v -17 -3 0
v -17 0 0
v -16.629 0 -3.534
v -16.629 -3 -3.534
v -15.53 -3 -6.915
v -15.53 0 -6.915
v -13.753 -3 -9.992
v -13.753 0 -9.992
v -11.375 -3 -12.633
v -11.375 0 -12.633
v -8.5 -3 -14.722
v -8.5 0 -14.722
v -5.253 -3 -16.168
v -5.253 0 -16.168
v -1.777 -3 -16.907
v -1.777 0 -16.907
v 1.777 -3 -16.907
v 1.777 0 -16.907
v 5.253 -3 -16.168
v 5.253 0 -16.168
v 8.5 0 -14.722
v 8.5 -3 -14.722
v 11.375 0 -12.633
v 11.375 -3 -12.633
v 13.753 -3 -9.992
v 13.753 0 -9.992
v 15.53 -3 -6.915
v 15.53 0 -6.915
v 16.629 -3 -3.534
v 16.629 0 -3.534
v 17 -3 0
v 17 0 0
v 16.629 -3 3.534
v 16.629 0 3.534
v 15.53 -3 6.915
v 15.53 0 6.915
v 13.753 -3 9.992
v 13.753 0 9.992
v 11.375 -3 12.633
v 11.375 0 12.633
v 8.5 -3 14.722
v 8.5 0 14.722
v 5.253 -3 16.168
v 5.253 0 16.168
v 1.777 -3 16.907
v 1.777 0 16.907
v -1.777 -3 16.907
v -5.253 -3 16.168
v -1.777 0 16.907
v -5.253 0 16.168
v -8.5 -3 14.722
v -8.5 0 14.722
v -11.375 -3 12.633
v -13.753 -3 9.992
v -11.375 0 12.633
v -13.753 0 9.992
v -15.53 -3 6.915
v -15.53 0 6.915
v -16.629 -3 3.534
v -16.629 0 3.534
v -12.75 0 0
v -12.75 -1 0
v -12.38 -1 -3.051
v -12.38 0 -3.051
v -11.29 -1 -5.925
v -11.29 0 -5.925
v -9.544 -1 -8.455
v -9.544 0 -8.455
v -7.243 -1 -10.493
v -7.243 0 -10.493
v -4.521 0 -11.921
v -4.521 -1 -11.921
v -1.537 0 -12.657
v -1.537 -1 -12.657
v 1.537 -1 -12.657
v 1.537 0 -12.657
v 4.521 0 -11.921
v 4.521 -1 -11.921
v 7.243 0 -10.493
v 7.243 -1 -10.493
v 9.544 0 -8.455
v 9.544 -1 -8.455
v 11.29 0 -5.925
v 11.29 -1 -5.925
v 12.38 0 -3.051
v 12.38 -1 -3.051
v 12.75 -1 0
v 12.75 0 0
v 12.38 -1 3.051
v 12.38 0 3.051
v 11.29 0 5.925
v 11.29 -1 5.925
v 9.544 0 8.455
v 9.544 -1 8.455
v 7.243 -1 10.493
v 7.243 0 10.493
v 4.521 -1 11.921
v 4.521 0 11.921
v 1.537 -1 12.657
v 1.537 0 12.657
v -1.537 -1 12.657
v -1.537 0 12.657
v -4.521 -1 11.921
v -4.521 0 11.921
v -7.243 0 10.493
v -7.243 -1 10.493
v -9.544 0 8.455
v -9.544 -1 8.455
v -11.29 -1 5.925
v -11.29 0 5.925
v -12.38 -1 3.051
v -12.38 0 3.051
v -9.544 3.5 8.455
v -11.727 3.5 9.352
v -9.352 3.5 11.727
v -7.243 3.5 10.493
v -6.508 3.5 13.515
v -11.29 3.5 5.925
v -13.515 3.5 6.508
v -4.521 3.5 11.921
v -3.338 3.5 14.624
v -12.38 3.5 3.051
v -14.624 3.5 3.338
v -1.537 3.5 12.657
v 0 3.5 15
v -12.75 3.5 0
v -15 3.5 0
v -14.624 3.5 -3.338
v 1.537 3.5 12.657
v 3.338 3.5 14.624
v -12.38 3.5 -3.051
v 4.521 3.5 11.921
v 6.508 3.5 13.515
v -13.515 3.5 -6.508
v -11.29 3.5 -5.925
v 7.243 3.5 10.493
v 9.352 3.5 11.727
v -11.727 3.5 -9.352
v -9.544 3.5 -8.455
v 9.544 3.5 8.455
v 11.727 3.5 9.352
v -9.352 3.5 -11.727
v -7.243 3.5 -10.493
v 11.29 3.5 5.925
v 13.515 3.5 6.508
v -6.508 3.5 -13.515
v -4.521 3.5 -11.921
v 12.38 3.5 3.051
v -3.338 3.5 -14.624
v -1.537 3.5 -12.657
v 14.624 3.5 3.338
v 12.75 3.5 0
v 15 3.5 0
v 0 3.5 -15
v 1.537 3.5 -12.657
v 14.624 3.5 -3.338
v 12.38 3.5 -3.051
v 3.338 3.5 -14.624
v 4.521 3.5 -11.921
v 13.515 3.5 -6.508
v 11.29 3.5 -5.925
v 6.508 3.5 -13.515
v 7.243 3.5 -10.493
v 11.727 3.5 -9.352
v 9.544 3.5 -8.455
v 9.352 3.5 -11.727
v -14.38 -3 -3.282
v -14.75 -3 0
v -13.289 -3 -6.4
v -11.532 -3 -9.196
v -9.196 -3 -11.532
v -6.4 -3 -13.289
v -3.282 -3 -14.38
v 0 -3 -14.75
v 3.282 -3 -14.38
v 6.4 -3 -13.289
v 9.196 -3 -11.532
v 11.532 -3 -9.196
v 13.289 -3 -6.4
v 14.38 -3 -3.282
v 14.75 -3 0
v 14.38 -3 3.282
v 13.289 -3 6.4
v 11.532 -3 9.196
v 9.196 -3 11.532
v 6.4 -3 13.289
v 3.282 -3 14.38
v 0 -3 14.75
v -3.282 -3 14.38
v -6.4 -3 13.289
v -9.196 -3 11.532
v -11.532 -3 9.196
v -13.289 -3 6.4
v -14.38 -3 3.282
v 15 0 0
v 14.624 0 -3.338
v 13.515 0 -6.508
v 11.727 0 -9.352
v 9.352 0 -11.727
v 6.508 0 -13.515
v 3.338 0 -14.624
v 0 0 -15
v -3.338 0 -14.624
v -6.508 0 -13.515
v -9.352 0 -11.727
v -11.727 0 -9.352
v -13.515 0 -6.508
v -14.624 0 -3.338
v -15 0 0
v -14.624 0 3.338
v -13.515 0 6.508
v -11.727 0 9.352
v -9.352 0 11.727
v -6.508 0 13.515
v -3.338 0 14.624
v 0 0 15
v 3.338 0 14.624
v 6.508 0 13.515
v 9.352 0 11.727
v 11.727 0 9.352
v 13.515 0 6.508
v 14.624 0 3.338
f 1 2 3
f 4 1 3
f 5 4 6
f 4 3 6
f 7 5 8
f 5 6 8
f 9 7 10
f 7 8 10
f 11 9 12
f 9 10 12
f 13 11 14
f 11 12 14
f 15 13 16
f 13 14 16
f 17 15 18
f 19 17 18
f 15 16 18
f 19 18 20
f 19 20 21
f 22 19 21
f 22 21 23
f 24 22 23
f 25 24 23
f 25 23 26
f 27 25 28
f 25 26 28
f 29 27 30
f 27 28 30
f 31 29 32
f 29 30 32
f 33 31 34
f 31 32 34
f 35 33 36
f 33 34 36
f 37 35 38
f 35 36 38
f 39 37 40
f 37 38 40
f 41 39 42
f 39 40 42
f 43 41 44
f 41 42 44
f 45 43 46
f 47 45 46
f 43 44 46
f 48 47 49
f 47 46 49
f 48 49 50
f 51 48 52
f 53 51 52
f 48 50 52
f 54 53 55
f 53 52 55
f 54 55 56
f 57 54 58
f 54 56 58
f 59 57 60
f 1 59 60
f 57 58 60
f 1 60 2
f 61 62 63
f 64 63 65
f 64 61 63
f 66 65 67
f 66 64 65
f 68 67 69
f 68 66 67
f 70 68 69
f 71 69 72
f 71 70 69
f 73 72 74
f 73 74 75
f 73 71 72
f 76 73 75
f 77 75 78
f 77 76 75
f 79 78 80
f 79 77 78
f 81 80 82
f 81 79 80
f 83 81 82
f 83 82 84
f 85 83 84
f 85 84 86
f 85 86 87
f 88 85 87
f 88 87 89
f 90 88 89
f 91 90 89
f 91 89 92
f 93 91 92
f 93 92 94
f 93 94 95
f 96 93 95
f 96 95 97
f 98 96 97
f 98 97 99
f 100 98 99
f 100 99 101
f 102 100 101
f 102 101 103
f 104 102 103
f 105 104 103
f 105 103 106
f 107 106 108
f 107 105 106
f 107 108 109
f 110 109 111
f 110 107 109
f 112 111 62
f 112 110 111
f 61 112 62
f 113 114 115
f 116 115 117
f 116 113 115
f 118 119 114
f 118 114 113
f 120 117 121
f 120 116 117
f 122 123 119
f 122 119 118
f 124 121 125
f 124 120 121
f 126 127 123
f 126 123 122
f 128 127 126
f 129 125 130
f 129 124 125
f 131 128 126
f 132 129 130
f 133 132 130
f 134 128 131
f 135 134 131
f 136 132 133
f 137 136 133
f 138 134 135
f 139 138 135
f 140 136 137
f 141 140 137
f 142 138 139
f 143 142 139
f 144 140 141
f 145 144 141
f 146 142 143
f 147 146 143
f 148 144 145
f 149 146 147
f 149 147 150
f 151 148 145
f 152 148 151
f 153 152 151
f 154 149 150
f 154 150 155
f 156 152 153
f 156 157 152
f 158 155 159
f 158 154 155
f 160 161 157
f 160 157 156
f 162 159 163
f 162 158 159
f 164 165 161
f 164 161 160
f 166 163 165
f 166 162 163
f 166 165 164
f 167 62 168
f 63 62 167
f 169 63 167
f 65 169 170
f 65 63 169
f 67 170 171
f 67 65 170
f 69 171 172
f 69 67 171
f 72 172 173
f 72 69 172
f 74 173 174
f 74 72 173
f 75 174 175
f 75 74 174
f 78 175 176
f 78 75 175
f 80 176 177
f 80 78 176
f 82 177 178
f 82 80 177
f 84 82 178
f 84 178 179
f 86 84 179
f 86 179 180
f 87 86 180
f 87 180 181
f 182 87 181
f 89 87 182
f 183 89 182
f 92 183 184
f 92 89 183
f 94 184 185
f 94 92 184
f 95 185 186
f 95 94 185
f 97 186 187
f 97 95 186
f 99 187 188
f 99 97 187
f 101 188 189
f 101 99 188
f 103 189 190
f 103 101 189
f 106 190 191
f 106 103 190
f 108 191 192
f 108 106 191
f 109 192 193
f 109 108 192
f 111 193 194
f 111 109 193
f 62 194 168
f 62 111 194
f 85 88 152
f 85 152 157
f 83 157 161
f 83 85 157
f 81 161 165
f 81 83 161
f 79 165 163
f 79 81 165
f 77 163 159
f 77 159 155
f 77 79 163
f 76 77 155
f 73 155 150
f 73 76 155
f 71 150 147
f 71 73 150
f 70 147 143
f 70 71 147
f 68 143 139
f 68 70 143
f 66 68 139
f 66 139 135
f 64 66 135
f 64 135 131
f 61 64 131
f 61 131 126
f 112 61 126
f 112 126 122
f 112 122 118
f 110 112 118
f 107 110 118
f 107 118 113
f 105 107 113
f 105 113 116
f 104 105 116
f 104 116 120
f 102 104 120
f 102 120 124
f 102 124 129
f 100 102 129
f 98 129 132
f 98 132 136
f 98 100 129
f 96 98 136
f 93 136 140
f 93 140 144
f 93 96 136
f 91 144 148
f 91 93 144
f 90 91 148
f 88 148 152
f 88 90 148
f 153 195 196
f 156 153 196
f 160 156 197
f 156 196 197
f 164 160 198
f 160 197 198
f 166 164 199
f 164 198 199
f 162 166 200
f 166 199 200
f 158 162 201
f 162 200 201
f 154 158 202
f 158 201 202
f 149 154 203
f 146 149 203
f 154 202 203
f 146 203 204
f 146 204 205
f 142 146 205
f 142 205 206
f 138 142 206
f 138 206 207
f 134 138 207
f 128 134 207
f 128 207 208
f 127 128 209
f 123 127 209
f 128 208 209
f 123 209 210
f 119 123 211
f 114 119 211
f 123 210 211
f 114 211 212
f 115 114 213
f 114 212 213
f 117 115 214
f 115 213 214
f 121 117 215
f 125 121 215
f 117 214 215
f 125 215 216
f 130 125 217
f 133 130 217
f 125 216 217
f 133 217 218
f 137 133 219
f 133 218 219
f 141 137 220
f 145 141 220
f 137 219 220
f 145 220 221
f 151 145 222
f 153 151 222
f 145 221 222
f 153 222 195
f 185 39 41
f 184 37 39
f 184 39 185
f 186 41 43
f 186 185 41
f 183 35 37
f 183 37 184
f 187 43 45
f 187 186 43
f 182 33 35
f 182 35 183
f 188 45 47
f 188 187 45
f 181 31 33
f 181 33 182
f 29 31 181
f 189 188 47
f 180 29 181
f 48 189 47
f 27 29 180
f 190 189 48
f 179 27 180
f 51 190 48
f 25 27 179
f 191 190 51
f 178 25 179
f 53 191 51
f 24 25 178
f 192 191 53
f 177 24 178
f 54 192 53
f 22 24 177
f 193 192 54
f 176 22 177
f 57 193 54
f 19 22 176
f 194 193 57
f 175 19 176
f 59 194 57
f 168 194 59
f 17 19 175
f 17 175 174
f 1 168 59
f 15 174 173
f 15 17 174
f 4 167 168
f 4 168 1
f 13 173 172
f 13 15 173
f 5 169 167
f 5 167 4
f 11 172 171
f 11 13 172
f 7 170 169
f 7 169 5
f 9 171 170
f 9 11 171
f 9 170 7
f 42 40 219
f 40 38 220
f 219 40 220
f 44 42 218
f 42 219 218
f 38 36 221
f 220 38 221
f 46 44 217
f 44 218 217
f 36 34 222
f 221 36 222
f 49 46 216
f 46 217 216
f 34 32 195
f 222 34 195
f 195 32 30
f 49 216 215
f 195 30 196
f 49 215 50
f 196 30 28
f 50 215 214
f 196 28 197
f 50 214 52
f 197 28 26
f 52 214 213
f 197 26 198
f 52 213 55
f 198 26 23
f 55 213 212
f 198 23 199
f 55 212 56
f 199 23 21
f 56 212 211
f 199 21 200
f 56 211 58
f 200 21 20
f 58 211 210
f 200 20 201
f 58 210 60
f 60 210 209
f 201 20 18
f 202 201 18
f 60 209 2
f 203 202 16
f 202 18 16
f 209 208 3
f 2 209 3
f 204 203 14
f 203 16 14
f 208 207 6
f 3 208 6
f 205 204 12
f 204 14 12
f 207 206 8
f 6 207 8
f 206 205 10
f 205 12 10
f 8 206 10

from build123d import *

# Parameters (mm, degrees)
SKETCH_1_R      = 15
SKETCH_1_R_2    = 12.75
EXTRUDE_1_DEPTH = 3.5
SKETCH_2_R      = 17
SKETCH_2_R_2    = 12.75
EXTRUDE_2_DEPTH = 3
CHAMFER_1_SIZE  = 2


with BuildPart() as part:
    # 草图1 → 凸台-拉伸1 (new body)
    with BuildSketch(Plane(origin=(0, 0, 0), x_dir=(1, 0, 0), z_dir=(0, 1, 0))):
        Circle(SKETCH_1_R)
        Circle(SKETCH_1_R_2, mode=Mode.SUBTRACT)
    extrude(amount=EXTRUDE_1_DEPTH)

    # 草图2 → 凸台-拉伸2 (add)
    with BuildSketch(Plane(origin=(0, 0, 0), x_dir=(-1, 0, 0), z_dir=(0, -1, 0))):
        Circle(SKETCH_2_R)
        Circle(SKETCH_2_R_2, mode=Mode.SUBTRACT)
    extrude(amount=EXTRUDE_2_DEPTH)

    # 倒角1
    chamfer_1_edges = [part.edges().sort_by_distance(p)[0] for p in [
        (12.75, -3, 0),
    ]]
    chamfer(chamfer_1_edges, length=CHAMFER_1_SIZE)


solid = part.part
